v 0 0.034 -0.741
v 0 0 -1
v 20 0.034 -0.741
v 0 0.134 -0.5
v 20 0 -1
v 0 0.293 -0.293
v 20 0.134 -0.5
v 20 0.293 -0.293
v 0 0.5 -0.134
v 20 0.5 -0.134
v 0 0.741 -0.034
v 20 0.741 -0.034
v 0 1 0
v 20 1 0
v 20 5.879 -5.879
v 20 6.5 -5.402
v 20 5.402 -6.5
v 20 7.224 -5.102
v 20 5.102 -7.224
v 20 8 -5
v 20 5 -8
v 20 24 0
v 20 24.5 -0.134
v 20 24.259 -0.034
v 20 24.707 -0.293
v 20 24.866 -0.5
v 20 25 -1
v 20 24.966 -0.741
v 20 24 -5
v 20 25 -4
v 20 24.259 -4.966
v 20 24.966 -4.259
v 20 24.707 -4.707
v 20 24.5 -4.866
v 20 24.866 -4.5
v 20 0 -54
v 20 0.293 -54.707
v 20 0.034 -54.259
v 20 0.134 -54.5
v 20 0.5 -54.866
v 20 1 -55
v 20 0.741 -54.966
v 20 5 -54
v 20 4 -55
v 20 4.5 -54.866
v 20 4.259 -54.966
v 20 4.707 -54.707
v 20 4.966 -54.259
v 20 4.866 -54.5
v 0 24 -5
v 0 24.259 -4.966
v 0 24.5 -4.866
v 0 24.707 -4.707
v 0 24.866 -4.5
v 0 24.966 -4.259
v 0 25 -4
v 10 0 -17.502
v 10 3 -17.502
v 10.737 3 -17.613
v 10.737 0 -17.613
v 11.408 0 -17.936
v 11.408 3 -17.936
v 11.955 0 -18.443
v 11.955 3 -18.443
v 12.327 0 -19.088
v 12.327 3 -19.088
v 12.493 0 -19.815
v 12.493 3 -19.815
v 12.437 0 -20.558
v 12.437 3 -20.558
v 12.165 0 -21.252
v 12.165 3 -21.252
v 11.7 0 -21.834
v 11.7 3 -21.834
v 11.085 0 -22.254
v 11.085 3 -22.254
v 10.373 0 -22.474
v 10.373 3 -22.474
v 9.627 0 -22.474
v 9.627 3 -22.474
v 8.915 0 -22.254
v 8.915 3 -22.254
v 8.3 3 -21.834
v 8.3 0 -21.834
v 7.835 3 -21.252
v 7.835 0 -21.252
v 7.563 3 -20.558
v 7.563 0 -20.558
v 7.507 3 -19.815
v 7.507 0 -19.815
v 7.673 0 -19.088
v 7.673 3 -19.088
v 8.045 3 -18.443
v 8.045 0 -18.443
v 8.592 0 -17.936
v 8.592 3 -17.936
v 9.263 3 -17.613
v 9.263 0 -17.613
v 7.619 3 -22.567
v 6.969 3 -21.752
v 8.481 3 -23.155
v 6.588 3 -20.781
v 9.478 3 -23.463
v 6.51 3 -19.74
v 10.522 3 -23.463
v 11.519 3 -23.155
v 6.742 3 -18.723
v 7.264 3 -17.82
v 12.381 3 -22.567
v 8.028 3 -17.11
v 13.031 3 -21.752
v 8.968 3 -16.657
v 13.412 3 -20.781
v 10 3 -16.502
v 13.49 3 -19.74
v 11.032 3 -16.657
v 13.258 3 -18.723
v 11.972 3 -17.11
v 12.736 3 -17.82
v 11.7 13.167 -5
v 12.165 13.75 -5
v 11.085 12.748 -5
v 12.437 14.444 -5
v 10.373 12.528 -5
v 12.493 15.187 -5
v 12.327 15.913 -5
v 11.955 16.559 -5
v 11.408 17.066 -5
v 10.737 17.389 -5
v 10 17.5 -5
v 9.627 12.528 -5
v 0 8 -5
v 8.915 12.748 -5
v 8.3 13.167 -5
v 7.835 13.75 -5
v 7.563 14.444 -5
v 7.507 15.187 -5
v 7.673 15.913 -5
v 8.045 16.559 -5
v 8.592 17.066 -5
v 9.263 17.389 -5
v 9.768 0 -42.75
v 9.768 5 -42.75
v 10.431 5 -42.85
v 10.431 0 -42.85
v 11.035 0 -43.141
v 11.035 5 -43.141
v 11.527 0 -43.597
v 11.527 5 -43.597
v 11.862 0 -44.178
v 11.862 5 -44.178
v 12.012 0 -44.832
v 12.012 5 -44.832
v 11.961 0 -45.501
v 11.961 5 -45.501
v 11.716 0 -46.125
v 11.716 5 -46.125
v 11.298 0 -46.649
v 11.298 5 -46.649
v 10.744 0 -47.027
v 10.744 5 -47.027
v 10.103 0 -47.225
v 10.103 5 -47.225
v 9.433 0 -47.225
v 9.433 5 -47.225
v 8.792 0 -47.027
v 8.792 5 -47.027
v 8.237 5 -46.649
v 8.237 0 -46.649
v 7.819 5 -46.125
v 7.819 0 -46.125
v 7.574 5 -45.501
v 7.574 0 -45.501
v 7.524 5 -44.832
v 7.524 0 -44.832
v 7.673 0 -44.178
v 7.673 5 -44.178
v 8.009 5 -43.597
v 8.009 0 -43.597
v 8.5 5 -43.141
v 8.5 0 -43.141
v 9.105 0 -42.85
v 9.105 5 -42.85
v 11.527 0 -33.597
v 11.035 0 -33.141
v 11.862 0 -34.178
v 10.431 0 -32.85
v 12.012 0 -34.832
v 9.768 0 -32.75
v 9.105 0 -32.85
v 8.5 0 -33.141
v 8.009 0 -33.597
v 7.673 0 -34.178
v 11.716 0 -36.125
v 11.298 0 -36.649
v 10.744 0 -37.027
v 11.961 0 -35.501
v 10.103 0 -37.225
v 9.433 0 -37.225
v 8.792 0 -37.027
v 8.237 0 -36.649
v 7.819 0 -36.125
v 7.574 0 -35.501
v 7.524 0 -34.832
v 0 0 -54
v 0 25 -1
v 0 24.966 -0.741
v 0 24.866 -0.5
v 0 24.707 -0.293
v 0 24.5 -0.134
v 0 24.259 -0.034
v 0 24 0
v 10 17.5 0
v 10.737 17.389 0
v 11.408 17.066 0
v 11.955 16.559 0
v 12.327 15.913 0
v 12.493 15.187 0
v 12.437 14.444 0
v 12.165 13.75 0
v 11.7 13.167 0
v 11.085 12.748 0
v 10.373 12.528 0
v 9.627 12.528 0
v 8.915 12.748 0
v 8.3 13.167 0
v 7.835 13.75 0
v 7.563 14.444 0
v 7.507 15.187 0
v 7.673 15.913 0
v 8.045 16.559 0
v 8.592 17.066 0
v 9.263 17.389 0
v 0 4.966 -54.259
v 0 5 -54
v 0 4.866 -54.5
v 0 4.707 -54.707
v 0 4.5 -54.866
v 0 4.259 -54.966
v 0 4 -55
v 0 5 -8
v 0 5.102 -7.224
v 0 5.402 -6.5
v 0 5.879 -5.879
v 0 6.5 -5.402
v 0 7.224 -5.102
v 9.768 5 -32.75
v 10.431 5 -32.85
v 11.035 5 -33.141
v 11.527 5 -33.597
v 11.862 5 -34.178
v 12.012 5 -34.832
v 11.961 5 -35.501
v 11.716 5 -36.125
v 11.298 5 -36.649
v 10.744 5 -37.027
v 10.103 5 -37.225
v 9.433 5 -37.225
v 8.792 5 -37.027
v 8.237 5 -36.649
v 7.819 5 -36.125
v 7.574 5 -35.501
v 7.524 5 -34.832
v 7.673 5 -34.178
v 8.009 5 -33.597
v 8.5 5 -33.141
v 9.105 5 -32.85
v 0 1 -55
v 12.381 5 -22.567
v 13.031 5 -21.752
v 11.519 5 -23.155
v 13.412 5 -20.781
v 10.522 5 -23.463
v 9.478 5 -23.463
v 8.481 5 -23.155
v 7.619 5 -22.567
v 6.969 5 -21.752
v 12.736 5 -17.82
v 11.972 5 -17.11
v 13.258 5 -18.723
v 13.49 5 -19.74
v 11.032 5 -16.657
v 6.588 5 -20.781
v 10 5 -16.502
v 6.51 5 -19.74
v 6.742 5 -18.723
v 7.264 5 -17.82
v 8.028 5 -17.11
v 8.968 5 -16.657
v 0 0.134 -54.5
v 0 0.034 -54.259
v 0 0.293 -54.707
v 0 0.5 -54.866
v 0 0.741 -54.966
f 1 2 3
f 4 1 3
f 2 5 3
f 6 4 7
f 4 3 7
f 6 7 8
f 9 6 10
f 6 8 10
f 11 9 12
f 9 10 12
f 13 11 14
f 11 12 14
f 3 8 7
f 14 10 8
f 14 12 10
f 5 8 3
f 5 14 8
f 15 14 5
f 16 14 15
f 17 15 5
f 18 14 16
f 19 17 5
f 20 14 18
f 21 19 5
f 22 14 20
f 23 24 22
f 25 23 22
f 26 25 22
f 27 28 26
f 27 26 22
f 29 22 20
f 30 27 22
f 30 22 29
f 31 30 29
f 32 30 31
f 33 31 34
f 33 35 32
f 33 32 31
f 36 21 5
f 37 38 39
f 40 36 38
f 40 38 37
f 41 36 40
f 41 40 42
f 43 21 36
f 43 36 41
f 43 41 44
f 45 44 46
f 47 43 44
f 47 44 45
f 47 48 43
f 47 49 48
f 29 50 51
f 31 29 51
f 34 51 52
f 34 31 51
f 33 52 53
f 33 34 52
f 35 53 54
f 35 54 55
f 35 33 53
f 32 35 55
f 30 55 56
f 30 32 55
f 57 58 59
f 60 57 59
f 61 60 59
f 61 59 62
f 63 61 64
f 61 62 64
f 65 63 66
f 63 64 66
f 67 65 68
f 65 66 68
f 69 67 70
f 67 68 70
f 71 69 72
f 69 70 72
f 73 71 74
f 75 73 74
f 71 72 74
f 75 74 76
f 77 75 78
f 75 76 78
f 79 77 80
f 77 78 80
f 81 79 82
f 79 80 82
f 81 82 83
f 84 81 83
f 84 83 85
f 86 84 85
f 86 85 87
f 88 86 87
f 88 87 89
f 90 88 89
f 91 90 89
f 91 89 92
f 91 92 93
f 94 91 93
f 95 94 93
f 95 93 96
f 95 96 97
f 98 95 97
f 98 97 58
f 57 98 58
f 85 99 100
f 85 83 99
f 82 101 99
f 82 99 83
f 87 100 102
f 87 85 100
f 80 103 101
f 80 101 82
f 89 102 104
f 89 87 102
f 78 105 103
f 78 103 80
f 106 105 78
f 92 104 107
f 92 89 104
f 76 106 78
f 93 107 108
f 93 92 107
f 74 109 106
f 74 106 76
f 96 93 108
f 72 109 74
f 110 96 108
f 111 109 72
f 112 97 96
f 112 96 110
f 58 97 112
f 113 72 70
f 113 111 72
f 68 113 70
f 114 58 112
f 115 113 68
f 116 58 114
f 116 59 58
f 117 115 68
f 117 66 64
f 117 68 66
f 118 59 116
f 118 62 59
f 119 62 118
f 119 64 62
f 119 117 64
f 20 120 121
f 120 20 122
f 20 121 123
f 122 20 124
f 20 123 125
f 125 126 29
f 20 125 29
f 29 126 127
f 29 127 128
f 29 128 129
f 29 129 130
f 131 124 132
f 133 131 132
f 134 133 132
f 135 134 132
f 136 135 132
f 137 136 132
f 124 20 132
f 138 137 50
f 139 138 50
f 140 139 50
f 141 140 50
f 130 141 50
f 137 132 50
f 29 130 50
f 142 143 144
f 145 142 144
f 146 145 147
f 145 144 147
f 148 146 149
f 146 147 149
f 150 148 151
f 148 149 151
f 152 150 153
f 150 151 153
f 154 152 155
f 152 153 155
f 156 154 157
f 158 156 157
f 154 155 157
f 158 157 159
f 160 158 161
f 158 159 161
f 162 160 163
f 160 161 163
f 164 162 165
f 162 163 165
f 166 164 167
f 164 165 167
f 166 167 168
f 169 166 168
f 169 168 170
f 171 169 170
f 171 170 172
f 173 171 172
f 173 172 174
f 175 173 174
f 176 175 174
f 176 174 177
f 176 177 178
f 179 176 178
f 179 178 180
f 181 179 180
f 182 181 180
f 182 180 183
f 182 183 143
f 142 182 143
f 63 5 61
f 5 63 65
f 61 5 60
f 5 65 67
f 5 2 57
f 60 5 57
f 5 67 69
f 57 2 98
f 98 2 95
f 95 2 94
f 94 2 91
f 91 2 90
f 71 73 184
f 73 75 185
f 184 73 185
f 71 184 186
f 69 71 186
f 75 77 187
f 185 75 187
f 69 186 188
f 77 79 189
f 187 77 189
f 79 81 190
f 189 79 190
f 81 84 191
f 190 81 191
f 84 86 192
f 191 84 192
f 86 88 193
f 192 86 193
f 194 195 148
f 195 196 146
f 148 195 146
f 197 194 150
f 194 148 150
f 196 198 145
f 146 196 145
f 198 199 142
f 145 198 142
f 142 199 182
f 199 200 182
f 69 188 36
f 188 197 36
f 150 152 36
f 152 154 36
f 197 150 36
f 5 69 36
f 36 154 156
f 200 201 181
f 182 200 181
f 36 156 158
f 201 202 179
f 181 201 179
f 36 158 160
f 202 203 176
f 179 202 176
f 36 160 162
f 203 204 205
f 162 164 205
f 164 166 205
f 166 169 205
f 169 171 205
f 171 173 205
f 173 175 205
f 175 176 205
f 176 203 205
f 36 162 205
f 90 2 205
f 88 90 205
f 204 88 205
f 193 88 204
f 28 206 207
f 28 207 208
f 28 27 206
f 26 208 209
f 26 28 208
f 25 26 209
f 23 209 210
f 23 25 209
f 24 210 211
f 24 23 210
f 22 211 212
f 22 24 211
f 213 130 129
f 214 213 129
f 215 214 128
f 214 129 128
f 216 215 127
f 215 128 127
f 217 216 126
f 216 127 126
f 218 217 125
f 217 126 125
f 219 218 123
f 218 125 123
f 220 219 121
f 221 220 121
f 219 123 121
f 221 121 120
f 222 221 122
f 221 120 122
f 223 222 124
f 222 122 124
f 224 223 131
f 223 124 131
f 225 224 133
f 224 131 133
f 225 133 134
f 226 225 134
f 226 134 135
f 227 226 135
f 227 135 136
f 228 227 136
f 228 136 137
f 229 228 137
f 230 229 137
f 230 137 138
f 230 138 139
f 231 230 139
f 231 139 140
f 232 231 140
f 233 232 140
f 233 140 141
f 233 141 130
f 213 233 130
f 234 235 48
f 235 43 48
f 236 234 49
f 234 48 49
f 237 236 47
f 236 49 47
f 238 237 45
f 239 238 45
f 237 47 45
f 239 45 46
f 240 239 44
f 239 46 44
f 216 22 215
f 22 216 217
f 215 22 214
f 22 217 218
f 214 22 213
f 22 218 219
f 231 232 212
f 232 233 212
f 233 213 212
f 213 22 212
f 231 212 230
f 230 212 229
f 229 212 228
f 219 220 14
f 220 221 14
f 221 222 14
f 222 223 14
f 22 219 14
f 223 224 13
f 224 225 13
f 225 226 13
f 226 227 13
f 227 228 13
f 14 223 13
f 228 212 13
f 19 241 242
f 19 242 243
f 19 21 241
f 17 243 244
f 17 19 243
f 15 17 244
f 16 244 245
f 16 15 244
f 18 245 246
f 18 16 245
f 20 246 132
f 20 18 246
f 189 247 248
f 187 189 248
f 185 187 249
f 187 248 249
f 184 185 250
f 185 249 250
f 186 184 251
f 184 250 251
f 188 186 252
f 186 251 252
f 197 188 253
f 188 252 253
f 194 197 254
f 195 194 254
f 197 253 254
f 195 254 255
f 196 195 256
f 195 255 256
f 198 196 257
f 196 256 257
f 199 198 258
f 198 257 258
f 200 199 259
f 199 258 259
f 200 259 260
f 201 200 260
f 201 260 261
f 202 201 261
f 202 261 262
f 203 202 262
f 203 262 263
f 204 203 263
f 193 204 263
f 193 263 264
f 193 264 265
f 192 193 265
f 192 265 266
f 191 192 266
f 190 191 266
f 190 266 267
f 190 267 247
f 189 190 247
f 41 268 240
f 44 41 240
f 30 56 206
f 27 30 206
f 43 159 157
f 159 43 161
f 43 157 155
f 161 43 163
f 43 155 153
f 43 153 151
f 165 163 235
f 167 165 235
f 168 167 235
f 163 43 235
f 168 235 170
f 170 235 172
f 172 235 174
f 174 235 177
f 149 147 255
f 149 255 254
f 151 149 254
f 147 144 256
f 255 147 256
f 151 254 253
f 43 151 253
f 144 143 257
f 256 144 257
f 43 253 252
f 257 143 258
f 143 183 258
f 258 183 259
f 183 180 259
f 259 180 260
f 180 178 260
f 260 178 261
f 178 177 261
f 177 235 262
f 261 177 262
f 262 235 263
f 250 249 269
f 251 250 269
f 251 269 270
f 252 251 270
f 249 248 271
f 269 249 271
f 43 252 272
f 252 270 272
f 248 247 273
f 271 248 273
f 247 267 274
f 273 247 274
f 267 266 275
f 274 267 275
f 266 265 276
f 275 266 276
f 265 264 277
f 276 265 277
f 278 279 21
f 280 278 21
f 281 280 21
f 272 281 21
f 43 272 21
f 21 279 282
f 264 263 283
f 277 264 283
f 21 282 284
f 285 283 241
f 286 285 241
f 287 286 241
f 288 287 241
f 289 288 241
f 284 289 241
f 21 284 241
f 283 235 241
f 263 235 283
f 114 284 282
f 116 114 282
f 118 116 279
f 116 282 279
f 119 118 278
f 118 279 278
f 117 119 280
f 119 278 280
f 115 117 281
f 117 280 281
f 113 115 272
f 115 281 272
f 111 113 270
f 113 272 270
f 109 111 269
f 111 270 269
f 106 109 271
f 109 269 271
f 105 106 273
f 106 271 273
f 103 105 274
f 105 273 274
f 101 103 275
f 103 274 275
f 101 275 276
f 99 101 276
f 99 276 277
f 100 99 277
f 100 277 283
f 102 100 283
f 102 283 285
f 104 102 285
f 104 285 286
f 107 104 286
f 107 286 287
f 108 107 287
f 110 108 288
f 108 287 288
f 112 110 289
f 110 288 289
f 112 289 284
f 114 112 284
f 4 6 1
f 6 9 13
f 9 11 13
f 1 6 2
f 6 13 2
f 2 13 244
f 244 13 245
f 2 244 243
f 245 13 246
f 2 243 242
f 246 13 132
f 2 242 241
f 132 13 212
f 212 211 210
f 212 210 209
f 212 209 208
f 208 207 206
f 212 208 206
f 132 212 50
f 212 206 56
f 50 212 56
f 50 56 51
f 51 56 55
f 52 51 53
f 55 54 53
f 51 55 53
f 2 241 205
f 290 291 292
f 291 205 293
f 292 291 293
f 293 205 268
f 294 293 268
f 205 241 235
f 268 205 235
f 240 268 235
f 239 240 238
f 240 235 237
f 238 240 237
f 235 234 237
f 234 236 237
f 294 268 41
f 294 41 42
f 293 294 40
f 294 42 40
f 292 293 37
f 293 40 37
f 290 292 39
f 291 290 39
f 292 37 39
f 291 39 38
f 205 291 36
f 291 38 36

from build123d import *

# Parameters (mm, degrees)
EXTRUDE_1_DEPTH     = 20
FILLET_1_R          = 3
FILLET_2_R          = 1
SKETCH_2_R          = 2.5
CUT_EXTRUDE_1_DEPTH = 20
SKETCH_3_R          = 2.25
SKETCH_3_R_2        = 2.5
CUT_EXTRUDE_2_DEPTH = 20
SKETCH_5_R          = 3.5
CUT_EXTRUDE_3_DEPTH = 2


with BuildPart() as part:
    # 草图1 → 凸台-拉伸1 (new body)
    with BuildSketch(Plane(origin=(0, 0, 0), x_dir=(0, 0, -1), z_dir=(1, 0, 0))):
        Polygon((0, 0), (55, 0), (55, 5), (5, 5), (5, 25), (0, 25), align=None)
    extrude(amount=EXTRUDE_1_DEPTH)

    # 圆角1
    fillet_1_edges = [part.edges().sort_by_distance(p)[0] for p in [
        (10, 5, -5),
    ]]
    fillet(fillet_1_edges, radius=FILLET_1_R)

    # 圆角2
    fillet_2_edges = [part.edges().sort_by_distance(p)[0] for p in [
        (10, 25, 0),
        (10, 25, -5),
        (10, 5, -55),
        (10, 0, -55),
        (10, 0, 0),
    ]]
    fillet(fillet_2_edges, radius=FILLET_2_R)

    # 草图2 → 切除-拉伸1 (cut)
    with BuildSketch(Plane(origin=(0, 0, -5), x_dir=(-1, 0, 0), z_dir=(0, 0, -1))):
        with Locations(Location((-10, 15, 0), (0, 0, 90))):
            Circle(SKETCH_2_R)
    extrude(amount=-CUT_EXTRUDE_1_DEPTH, mode=Mode.SUBTRACT)

    # 草图3 → 切除-拉伸2 (cut)
    with BuildSketch(Plane(origin=(0, 5, 0), x_dir=(1, 0, 0), z_dir=(0, 1, 0))):
        with Locations(Location((9.767852346, 45, 0), (0, 0, 270))):
            Circle(SKETCH_3_R)
        with Locations(Location((9.767852346, 35, 0), (0, 0, 270))):
            Circle(SKETCH_3_R)
        with Locations(Location((10, 20.001796525, 0), (0, 0, 270))):
            Circle(SKETCH_3_R_2)
    extrude(amount=-CUT_EXTRUDE_2_DEPTH, mode=Mode.SUBTRACT)

    # 草图5 → 切除-拉伸3 (cut)
    with BuildSketch(Plane(origin=(0, 5, 0), x_dir=(1, 0, 0), z_dir=(0, 1, 0))):
        with Locations(Location((10, 20.001796525, 0), (0, 0, 270))):
            Circle(SKETCH_5_R)
    extrude(amount=-CUT_EXTRUDE_3_DEPTH, mode=Mode.SUBTRACT)


solid = part.part
